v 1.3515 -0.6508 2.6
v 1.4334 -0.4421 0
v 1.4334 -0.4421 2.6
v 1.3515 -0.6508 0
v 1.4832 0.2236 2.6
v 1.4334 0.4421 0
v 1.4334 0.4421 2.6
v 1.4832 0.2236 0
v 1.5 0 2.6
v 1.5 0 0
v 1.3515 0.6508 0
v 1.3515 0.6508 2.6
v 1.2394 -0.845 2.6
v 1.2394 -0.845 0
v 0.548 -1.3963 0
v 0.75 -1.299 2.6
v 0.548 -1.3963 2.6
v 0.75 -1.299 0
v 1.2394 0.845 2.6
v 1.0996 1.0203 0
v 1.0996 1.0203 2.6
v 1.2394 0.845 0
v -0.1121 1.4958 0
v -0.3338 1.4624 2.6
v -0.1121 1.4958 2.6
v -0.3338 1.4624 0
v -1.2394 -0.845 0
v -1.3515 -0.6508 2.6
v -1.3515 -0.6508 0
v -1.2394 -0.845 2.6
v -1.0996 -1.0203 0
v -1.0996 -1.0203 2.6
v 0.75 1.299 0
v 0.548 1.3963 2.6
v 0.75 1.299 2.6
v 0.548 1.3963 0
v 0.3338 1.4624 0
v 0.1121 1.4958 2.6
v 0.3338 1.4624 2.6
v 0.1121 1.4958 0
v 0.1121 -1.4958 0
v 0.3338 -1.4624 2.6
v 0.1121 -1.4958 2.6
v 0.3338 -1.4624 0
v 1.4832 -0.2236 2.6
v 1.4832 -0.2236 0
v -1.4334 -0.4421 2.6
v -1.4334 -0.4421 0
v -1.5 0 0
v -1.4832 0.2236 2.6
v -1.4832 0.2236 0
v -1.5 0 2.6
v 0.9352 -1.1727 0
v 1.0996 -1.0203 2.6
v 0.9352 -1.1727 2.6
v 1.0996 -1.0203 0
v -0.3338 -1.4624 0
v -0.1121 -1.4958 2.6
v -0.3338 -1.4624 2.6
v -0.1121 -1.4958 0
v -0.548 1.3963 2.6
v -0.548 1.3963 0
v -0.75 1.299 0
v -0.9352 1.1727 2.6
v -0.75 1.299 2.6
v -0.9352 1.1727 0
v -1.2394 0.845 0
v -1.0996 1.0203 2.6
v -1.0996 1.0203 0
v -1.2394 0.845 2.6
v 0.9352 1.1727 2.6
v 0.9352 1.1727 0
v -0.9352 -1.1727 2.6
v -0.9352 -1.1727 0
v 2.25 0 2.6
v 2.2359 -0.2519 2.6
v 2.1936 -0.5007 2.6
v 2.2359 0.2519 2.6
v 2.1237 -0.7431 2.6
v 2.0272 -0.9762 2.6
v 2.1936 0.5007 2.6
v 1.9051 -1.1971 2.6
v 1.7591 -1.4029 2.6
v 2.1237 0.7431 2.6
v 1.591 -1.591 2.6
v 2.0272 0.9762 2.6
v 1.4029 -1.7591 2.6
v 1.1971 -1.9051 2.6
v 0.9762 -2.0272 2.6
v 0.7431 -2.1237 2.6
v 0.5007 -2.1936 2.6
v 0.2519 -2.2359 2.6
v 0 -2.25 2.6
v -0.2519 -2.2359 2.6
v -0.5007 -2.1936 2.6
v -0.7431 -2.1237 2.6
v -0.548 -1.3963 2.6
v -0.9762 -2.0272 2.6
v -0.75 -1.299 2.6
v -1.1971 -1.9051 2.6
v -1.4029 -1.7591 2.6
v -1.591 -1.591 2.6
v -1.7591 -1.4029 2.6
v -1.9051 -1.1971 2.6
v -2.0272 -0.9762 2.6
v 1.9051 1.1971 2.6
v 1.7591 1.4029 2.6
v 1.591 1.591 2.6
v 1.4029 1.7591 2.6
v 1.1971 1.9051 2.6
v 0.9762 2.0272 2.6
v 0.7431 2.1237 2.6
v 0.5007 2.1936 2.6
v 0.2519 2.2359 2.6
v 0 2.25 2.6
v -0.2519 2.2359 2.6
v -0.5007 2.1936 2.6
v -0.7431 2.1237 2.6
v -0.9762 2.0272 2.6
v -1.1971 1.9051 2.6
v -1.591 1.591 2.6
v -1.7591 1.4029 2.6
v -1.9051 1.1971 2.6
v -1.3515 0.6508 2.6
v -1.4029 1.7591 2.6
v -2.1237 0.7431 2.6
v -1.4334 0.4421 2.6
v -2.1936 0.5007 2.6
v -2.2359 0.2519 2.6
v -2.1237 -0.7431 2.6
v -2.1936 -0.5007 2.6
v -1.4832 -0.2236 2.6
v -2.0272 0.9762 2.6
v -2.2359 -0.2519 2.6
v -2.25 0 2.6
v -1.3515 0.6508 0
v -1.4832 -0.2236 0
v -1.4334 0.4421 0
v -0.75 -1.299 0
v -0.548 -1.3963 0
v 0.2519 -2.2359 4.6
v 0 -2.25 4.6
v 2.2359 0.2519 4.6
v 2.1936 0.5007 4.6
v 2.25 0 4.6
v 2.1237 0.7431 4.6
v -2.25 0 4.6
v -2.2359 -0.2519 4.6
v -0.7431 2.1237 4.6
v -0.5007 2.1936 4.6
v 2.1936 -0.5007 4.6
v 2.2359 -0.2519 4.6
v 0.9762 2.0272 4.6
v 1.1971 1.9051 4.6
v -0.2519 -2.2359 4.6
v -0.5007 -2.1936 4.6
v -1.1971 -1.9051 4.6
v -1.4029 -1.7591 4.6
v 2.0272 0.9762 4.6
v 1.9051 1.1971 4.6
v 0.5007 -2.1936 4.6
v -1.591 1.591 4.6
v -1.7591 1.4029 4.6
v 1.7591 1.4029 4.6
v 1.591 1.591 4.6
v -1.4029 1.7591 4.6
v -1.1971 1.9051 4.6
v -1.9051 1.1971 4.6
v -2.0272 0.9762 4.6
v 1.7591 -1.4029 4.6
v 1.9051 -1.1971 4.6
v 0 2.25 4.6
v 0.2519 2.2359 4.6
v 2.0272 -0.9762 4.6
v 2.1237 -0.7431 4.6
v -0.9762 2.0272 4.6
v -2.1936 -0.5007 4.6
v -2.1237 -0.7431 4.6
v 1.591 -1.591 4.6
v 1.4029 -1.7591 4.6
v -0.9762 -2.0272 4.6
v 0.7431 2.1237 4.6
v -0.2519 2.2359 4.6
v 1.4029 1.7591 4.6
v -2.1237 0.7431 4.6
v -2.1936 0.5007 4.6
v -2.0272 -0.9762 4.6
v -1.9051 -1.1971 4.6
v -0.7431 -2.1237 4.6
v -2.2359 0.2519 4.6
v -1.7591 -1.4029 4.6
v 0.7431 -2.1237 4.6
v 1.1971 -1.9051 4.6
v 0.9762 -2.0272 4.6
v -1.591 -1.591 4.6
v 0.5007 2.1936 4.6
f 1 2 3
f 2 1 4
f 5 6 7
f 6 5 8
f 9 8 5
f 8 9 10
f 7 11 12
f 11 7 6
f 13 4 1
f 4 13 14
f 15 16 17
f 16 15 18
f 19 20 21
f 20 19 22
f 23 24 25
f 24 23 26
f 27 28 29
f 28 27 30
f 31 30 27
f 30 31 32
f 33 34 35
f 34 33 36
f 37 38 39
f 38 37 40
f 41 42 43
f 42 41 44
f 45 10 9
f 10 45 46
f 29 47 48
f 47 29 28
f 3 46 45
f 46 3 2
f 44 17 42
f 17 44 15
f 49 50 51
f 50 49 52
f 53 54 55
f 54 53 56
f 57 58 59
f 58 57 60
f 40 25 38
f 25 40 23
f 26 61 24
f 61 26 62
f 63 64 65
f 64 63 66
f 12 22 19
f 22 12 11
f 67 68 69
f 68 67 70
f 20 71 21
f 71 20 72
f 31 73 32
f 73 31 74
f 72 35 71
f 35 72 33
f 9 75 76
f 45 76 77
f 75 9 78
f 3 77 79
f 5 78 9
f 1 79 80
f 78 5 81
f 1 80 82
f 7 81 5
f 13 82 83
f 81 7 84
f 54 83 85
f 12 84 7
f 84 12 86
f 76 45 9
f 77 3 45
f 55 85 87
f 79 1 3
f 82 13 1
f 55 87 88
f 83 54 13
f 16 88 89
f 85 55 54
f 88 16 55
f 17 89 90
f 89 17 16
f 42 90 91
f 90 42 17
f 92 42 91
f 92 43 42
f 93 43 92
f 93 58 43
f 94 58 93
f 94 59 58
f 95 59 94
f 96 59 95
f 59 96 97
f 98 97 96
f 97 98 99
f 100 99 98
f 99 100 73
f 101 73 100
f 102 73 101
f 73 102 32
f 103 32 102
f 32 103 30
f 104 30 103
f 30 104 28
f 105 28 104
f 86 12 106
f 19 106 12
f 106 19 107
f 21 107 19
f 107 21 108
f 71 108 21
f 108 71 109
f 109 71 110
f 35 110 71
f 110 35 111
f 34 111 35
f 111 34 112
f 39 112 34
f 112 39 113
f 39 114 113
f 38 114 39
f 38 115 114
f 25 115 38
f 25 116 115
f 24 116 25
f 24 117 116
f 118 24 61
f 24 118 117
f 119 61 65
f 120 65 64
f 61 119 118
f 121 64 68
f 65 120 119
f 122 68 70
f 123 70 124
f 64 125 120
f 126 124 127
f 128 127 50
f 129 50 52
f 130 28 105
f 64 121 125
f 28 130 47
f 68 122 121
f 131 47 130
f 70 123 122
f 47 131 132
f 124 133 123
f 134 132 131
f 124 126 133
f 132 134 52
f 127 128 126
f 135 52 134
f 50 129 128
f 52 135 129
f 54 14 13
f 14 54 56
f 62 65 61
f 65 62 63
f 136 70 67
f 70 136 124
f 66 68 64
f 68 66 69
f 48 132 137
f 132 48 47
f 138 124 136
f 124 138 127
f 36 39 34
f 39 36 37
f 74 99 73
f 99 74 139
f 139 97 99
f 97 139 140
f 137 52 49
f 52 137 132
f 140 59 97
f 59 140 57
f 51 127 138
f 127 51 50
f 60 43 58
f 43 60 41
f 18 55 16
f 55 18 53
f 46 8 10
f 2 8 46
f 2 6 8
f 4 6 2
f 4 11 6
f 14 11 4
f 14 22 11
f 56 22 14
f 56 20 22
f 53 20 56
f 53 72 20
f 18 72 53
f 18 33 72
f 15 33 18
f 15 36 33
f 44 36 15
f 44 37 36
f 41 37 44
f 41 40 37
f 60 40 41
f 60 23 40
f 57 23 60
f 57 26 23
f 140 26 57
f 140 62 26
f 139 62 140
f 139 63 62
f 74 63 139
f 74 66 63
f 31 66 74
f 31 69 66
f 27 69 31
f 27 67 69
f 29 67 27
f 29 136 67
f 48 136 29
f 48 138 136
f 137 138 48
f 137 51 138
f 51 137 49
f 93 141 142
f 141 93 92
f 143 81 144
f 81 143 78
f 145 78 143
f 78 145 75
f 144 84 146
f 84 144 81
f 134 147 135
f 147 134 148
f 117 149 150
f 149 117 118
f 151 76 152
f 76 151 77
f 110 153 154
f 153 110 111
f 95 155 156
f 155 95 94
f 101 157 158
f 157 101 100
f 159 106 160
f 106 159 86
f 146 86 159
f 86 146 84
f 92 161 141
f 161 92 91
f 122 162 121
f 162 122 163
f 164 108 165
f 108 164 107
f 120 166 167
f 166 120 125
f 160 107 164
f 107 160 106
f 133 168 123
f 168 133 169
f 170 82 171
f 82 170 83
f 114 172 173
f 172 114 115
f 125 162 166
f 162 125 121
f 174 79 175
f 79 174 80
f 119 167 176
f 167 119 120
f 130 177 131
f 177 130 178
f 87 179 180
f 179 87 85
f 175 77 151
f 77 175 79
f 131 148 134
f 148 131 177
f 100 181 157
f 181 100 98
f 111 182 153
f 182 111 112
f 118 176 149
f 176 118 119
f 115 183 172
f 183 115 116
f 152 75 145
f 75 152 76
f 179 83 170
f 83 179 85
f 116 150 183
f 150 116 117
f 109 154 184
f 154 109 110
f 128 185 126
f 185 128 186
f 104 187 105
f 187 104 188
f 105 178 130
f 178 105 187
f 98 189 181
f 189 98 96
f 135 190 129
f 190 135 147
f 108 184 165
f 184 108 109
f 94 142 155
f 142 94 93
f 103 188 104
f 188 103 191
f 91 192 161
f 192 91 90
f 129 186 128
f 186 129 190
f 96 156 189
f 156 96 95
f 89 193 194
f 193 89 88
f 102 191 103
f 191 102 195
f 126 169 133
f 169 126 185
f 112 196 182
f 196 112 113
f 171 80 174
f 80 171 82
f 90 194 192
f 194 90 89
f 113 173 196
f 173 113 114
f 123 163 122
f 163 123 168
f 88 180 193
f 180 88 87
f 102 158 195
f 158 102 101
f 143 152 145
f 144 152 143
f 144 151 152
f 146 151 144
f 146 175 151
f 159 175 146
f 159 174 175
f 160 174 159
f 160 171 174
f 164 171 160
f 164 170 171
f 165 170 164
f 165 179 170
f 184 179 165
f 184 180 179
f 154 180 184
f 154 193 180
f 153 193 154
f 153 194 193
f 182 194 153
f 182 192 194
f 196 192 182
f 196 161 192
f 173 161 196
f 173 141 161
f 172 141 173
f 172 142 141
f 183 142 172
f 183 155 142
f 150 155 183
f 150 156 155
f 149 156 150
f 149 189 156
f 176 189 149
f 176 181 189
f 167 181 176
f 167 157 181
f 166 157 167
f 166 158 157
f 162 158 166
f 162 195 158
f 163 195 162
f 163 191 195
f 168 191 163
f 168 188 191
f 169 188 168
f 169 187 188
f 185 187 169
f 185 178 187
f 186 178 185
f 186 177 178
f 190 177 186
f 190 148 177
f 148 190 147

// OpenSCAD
// part_id: cp-r2
// name: Rivet 3D x 2.6L
// source_drawing_ids: DRW-005
// units: mm
// revision: 0.1
// SPDX-License-Identifier: MIT

module part_cpr2() {
    union() {
        cylinder(d = 3.0, h = 2.6, center = false, $fn = 42);
        translate([0, 0, 2.6]) cylinder(d = 4.5, h = 1.0, center = false, $fn = 56);
        translate([0, 0, 3.6]) cylinder(d = 4.5, h = 1.0, center = false, $fn = 56);
    }
}

// ---- "main guard" ----
// Default to previewing when opened directly:
if (is_undef(__LIB_MODE__)) {
    part_cpr2();
}
